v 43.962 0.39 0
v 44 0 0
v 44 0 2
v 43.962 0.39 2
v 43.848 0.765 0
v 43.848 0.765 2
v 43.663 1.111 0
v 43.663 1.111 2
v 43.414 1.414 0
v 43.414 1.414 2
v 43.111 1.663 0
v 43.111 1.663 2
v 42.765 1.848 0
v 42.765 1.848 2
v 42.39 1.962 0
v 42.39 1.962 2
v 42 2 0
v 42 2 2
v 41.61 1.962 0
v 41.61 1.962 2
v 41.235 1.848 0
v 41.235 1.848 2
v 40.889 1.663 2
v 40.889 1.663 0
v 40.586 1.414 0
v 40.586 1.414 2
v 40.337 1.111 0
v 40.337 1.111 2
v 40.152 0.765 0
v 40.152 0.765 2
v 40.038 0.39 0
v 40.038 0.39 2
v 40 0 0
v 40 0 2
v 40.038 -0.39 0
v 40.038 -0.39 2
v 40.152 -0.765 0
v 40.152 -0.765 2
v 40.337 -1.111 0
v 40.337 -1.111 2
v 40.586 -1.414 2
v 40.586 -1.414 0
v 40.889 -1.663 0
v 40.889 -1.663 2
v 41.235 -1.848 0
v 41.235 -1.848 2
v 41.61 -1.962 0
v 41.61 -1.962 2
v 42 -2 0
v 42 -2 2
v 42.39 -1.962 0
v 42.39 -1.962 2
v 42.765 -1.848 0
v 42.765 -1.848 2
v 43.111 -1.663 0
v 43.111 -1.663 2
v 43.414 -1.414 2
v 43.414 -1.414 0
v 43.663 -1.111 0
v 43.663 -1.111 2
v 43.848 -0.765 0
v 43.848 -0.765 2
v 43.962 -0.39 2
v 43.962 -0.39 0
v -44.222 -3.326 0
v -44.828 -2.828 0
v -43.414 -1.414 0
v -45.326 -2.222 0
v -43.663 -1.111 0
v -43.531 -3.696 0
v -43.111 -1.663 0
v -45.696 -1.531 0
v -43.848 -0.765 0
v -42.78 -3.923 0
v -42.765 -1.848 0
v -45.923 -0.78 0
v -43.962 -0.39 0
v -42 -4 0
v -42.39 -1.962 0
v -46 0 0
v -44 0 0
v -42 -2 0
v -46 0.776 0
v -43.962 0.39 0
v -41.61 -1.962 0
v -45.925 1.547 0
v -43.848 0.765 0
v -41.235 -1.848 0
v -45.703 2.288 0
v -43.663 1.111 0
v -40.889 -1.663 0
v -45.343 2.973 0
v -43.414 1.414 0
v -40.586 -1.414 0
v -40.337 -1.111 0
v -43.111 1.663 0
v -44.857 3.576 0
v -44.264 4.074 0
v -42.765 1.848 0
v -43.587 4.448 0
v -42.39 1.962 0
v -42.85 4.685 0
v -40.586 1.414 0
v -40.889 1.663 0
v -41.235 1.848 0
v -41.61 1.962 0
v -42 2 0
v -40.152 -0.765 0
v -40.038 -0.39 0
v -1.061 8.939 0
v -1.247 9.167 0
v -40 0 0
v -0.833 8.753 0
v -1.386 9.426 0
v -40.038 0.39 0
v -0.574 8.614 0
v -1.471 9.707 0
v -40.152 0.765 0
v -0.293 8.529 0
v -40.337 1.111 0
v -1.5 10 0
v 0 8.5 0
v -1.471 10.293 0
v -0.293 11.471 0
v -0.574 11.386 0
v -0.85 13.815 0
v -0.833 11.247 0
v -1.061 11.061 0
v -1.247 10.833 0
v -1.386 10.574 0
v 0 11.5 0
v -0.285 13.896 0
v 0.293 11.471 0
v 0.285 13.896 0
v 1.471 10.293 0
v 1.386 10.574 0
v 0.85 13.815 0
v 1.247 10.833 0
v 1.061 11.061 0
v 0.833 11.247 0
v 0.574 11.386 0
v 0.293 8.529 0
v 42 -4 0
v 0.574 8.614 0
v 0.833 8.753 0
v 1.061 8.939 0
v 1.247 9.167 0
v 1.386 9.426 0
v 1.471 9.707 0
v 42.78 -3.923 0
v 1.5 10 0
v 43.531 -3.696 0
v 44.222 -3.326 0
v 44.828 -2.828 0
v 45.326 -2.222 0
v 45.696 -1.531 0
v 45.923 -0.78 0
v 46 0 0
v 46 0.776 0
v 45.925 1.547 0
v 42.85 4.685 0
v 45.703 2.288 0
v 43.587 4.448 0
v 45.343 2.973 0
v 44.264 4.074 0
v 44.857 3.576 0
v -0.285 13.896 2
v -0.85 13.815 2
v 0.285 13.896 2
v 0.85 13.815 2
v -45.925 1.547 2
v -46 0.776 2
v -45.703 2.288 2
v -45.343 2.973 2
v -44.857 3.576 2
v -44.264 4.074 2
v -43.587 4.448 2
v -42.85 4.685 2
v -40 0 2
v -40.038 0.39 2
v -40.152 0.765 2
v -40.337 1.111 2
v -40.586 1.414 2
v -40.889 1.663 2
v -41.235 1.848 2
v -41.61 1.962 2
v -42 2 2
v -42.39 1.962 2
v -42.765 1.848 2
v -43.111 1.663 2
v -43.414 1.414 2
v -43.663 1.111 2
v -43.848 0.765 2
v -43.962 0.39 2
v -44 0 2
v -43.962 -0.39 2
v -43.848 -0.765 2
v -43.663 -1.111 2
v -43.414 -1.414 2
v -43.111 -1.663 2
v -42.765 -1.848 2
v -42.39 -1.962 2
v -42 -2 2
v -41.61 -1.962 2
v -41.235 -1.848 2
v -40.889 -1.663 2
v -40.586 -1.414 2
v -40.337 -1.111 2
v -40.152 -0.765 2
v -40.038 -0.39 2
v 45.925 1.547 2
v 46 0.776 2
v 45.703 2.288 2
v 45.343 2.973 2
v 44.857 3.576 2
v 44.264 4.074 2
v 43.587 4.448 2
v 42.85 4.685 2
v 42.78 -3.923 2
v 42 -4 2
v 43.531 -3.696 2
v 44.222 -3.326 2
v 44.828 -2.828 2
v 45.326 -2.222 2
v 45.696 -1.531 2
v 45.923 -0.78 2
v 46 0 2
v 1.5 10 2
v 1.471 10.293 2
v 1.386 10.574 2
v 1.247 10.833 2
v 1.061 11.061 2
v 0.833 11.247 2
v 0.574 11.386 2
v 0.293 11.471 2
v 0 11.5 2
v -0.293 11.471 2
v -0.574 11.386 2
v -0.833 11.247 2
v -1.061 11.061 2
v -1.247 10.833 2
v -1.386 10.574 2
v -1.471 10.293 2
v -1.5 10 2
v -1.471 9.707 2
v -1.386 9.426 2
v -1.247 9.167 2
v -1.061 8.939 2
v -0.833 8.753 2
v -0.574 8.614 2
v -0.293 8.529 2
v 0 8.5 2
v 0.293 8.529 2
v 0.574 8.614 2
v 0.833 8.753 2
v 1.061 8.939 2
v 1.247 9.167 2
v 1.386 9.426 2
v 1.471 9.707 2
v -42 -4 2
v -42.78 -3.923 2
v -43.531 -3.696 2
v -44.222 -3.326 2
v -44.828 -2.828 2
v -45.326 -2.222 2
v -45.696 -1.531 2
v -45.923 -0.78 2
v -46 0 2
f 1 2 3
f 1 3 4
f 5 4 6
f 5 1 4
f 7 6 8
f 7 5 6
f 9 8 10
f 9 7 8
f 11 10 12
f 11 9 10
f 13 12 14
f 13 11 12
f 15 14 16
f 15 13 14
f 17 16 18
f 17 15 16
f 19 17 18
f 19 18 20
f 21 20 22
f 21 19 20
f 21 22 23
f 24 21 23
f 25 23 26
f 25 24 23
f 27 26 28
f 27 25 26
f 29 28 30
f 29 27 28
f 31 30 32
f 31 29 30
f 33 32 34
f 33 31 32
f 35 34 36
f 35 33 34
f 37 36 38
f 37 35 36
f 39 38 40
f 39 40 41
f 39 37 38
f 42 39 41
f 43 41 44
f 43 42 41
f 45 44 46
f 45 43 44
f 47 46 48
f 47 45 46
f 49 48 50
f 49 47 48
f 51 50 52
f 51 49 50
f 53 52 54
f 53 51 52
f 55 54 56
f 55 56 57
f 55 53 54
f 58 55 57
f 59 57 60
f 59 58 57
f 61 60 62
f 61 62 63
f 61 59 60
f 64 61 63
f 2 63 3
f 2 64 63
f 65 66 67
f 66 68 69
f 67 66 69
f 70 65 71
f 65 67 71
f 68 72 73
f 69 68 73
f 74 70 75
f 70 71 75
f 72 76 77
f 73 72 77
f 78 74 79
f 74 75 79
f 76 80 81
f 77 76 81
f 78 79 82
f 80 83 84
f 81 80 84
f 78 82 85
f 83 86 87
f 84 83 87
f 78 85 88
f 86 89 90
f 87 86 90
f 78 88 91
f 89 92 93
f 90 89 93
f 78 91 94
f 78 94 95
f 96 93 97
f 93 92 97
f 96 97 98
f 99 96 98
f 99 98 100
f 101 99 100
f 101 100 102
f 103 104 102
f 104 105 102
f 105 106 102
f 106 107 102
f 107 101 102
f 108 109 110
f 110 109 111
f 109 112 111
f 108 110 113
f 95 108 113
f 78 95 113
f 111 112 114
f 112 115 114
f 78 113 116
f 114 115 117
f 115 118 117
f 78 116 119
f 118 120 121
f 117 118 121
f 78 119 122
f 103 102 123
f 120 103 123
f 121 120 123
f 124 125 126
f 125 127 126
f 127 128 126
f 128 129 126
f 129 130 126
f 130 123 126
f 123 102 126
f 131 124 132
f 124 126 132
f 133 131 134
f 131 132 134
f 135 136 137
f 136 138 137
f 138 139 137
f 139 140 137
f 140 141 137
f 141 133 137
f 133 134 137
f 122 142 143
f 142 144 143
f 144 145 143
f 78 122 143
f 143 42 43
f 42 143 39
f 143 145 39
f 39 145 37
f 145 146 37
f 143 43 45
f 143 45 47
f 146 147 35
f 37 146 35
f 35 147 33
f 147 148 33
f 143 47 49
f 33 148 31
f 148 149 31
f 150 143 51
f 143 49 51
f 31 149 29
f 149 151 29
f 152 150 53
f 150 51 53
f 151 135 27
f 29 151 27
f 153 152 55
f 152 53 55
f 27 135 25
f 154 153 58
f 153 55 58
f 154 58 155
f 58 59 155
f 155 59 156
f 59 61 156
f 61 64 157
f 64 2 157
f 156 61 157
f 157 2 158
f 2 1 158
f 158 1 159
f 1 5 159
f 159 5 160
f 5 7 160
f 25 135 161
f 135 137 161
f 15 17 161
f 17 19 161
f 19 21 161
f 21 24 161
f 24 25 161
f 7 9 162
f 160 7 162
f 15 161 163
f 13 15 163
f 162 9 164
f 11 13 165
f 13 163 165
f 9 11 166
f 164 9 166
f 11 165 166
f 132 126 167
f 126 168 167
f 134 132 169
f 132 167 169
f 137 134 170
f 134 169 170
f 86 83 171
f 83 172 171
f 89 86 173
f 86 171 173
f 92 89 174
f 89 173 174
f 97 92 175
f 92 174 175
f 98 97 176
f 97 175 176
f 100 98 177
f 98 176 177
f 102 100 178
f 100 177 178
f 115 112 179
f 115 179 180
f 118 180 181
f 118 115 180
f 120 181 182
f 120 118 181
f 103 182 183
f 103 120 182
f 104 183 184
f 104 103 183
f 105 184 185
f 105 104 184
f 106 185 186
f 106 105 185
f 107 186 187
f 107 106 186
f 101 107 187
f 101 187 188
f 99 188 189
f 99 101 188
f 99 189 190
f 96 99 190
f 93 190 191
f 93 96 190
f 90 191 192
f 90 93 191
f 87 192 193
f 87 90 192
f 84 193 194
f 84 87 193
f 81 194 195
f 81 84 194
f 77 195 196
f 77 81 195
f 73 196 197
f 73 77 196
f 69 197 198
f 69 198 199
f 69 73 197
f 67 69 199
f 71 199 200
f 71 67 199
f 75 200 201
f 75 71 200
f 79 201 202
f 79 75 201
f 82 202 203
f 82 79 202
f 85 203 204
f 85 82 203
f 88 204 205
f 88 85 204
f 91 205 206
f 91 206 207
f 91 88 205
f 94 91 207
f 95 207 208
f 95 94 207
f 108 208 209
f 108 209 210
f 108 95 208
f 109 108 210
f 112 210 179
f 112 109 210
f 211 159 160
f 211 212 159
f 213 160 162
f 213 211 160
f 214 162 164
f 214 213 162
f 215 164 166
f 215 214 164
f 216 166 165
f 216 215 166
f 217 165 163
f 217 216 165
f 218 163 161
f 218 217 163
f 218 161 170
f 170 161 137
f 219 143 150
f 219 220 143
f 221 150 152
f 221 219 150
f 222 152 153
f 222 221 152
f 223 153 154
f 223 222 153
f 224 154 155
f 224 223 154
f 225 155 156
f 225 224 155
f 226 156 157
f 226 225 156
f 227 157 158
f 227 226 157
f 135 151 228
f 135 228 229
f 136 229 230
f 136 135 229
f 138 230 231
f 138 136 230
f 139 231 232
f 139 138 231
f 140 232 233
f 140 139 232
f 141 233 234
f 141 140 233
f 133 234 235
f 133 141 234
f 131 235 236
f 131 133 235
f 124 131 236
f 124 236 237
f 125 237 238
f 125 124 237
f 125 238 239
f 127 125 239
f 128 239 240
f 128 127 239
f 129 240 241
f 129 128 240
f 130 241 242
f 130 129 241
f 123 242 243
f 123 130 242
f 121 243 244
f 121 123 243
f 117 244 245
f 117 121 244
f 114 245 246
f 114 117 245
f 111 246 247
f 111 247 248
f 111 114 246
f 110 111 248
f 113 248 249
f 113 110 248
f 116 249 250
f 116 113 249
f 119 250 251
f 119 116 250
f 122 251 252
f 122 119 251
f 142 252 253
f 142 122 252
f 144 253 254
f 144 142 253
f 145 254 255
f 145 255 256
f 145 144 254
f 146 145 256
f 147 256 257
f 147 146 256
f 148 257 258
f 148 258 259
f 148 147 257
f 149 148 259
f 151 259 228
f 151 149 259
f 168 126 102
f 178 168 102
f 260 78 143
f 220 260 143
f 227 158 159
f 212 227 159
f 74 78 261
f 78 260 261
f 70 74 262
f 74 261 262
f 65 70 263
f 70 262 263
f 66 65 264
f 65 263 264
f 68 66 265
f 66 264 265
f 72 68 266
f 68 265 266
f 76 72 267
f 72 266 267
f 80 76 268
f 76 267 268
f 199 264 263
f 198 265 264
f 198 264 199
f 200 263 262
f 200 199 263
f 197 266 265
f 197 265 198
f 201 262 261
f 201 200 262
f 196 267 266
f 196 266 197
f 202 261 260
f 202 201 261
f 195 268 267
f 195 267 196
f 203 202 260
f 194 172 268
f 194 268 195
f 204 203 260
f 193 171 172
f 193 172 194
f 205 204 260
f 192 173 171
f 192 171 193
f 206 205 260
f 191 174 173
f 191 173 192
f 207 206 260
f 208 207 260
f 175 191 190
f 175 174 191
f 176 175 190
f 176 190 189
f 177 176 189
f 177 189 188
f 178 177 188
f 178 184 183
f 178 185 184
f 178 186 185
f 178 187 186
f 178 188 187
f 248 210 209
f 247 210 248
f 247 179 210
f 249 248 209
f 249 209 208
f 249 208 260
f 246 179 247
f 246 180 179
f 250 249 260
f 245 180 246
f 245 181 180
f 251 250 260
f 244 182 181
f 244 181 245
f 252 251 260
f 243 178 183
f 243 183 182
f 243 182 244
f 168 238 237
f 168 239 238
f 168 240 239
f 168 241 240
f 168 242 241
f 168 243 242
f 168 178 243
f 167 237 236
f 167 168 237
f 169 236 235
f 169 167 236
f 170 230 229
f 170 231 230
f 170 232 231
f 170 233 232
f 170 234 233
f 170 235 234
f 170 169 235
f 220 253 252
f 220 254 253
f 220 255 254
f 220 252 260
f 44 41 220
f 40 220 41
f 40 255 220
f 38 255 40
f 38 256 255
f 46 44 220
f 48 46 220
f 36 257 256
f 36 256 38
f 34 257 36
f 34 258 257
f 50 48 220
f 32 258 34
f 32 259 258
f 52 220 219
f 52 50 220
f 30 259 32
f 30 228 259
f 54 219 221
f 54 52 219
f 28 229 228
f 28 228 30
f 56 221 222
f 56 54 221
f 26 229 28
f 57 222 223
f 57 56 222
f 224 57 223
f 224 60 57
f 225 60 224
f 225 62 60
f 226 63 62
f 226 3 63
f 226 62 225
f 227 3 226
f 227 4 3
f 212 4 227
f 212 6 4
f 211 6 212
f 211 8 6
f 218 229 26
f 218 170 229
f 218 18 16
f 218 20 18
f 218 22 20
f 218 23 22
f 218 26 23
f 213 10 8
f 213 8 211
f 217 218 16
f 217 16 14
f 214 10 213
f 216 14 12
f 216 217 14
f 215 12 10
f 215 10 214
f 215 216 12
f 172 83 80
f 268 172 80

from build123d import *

# Parameters (mm, degrees)
SKETCH_R   = 2
SKETCH_R_2 = 1.5
PAD_DEPTH  = 2
FILLET_R   = 4


with BuildPart() as part:
    # Sketch → Pad (new body)
    with BuildSketch(Plane.XY):
        Polygon((-46, -4), (46, -4), (46, 4), (0, 14), (-46, 4), align=None)
        with Locations((-42, 0)):
            Circle(SKETCH_R, mode=Mode.SUBTRACT)
        with Locations((42, 0)):
            Circle(SKETCH_R, mode=Mode.SUBTRACT)
        with Locations((0, 10)):
            Circle(SKETCH_R_2, mode=Mode.SUBTRACT)
    extrude(amount=PAD_DEPTH)

    # Fillet
    fillet_edges = [part.edges().sort_by_distance(p)[0] for p in [
        (46, -4, 1),
        (46, 4, 1),
        (-46, -4, 1),
        (-46, 4, 1),
        (0, 14, 1),
    ]]
    fillet(fillet_edges, radius=FILLET_R)


solid = part.part
